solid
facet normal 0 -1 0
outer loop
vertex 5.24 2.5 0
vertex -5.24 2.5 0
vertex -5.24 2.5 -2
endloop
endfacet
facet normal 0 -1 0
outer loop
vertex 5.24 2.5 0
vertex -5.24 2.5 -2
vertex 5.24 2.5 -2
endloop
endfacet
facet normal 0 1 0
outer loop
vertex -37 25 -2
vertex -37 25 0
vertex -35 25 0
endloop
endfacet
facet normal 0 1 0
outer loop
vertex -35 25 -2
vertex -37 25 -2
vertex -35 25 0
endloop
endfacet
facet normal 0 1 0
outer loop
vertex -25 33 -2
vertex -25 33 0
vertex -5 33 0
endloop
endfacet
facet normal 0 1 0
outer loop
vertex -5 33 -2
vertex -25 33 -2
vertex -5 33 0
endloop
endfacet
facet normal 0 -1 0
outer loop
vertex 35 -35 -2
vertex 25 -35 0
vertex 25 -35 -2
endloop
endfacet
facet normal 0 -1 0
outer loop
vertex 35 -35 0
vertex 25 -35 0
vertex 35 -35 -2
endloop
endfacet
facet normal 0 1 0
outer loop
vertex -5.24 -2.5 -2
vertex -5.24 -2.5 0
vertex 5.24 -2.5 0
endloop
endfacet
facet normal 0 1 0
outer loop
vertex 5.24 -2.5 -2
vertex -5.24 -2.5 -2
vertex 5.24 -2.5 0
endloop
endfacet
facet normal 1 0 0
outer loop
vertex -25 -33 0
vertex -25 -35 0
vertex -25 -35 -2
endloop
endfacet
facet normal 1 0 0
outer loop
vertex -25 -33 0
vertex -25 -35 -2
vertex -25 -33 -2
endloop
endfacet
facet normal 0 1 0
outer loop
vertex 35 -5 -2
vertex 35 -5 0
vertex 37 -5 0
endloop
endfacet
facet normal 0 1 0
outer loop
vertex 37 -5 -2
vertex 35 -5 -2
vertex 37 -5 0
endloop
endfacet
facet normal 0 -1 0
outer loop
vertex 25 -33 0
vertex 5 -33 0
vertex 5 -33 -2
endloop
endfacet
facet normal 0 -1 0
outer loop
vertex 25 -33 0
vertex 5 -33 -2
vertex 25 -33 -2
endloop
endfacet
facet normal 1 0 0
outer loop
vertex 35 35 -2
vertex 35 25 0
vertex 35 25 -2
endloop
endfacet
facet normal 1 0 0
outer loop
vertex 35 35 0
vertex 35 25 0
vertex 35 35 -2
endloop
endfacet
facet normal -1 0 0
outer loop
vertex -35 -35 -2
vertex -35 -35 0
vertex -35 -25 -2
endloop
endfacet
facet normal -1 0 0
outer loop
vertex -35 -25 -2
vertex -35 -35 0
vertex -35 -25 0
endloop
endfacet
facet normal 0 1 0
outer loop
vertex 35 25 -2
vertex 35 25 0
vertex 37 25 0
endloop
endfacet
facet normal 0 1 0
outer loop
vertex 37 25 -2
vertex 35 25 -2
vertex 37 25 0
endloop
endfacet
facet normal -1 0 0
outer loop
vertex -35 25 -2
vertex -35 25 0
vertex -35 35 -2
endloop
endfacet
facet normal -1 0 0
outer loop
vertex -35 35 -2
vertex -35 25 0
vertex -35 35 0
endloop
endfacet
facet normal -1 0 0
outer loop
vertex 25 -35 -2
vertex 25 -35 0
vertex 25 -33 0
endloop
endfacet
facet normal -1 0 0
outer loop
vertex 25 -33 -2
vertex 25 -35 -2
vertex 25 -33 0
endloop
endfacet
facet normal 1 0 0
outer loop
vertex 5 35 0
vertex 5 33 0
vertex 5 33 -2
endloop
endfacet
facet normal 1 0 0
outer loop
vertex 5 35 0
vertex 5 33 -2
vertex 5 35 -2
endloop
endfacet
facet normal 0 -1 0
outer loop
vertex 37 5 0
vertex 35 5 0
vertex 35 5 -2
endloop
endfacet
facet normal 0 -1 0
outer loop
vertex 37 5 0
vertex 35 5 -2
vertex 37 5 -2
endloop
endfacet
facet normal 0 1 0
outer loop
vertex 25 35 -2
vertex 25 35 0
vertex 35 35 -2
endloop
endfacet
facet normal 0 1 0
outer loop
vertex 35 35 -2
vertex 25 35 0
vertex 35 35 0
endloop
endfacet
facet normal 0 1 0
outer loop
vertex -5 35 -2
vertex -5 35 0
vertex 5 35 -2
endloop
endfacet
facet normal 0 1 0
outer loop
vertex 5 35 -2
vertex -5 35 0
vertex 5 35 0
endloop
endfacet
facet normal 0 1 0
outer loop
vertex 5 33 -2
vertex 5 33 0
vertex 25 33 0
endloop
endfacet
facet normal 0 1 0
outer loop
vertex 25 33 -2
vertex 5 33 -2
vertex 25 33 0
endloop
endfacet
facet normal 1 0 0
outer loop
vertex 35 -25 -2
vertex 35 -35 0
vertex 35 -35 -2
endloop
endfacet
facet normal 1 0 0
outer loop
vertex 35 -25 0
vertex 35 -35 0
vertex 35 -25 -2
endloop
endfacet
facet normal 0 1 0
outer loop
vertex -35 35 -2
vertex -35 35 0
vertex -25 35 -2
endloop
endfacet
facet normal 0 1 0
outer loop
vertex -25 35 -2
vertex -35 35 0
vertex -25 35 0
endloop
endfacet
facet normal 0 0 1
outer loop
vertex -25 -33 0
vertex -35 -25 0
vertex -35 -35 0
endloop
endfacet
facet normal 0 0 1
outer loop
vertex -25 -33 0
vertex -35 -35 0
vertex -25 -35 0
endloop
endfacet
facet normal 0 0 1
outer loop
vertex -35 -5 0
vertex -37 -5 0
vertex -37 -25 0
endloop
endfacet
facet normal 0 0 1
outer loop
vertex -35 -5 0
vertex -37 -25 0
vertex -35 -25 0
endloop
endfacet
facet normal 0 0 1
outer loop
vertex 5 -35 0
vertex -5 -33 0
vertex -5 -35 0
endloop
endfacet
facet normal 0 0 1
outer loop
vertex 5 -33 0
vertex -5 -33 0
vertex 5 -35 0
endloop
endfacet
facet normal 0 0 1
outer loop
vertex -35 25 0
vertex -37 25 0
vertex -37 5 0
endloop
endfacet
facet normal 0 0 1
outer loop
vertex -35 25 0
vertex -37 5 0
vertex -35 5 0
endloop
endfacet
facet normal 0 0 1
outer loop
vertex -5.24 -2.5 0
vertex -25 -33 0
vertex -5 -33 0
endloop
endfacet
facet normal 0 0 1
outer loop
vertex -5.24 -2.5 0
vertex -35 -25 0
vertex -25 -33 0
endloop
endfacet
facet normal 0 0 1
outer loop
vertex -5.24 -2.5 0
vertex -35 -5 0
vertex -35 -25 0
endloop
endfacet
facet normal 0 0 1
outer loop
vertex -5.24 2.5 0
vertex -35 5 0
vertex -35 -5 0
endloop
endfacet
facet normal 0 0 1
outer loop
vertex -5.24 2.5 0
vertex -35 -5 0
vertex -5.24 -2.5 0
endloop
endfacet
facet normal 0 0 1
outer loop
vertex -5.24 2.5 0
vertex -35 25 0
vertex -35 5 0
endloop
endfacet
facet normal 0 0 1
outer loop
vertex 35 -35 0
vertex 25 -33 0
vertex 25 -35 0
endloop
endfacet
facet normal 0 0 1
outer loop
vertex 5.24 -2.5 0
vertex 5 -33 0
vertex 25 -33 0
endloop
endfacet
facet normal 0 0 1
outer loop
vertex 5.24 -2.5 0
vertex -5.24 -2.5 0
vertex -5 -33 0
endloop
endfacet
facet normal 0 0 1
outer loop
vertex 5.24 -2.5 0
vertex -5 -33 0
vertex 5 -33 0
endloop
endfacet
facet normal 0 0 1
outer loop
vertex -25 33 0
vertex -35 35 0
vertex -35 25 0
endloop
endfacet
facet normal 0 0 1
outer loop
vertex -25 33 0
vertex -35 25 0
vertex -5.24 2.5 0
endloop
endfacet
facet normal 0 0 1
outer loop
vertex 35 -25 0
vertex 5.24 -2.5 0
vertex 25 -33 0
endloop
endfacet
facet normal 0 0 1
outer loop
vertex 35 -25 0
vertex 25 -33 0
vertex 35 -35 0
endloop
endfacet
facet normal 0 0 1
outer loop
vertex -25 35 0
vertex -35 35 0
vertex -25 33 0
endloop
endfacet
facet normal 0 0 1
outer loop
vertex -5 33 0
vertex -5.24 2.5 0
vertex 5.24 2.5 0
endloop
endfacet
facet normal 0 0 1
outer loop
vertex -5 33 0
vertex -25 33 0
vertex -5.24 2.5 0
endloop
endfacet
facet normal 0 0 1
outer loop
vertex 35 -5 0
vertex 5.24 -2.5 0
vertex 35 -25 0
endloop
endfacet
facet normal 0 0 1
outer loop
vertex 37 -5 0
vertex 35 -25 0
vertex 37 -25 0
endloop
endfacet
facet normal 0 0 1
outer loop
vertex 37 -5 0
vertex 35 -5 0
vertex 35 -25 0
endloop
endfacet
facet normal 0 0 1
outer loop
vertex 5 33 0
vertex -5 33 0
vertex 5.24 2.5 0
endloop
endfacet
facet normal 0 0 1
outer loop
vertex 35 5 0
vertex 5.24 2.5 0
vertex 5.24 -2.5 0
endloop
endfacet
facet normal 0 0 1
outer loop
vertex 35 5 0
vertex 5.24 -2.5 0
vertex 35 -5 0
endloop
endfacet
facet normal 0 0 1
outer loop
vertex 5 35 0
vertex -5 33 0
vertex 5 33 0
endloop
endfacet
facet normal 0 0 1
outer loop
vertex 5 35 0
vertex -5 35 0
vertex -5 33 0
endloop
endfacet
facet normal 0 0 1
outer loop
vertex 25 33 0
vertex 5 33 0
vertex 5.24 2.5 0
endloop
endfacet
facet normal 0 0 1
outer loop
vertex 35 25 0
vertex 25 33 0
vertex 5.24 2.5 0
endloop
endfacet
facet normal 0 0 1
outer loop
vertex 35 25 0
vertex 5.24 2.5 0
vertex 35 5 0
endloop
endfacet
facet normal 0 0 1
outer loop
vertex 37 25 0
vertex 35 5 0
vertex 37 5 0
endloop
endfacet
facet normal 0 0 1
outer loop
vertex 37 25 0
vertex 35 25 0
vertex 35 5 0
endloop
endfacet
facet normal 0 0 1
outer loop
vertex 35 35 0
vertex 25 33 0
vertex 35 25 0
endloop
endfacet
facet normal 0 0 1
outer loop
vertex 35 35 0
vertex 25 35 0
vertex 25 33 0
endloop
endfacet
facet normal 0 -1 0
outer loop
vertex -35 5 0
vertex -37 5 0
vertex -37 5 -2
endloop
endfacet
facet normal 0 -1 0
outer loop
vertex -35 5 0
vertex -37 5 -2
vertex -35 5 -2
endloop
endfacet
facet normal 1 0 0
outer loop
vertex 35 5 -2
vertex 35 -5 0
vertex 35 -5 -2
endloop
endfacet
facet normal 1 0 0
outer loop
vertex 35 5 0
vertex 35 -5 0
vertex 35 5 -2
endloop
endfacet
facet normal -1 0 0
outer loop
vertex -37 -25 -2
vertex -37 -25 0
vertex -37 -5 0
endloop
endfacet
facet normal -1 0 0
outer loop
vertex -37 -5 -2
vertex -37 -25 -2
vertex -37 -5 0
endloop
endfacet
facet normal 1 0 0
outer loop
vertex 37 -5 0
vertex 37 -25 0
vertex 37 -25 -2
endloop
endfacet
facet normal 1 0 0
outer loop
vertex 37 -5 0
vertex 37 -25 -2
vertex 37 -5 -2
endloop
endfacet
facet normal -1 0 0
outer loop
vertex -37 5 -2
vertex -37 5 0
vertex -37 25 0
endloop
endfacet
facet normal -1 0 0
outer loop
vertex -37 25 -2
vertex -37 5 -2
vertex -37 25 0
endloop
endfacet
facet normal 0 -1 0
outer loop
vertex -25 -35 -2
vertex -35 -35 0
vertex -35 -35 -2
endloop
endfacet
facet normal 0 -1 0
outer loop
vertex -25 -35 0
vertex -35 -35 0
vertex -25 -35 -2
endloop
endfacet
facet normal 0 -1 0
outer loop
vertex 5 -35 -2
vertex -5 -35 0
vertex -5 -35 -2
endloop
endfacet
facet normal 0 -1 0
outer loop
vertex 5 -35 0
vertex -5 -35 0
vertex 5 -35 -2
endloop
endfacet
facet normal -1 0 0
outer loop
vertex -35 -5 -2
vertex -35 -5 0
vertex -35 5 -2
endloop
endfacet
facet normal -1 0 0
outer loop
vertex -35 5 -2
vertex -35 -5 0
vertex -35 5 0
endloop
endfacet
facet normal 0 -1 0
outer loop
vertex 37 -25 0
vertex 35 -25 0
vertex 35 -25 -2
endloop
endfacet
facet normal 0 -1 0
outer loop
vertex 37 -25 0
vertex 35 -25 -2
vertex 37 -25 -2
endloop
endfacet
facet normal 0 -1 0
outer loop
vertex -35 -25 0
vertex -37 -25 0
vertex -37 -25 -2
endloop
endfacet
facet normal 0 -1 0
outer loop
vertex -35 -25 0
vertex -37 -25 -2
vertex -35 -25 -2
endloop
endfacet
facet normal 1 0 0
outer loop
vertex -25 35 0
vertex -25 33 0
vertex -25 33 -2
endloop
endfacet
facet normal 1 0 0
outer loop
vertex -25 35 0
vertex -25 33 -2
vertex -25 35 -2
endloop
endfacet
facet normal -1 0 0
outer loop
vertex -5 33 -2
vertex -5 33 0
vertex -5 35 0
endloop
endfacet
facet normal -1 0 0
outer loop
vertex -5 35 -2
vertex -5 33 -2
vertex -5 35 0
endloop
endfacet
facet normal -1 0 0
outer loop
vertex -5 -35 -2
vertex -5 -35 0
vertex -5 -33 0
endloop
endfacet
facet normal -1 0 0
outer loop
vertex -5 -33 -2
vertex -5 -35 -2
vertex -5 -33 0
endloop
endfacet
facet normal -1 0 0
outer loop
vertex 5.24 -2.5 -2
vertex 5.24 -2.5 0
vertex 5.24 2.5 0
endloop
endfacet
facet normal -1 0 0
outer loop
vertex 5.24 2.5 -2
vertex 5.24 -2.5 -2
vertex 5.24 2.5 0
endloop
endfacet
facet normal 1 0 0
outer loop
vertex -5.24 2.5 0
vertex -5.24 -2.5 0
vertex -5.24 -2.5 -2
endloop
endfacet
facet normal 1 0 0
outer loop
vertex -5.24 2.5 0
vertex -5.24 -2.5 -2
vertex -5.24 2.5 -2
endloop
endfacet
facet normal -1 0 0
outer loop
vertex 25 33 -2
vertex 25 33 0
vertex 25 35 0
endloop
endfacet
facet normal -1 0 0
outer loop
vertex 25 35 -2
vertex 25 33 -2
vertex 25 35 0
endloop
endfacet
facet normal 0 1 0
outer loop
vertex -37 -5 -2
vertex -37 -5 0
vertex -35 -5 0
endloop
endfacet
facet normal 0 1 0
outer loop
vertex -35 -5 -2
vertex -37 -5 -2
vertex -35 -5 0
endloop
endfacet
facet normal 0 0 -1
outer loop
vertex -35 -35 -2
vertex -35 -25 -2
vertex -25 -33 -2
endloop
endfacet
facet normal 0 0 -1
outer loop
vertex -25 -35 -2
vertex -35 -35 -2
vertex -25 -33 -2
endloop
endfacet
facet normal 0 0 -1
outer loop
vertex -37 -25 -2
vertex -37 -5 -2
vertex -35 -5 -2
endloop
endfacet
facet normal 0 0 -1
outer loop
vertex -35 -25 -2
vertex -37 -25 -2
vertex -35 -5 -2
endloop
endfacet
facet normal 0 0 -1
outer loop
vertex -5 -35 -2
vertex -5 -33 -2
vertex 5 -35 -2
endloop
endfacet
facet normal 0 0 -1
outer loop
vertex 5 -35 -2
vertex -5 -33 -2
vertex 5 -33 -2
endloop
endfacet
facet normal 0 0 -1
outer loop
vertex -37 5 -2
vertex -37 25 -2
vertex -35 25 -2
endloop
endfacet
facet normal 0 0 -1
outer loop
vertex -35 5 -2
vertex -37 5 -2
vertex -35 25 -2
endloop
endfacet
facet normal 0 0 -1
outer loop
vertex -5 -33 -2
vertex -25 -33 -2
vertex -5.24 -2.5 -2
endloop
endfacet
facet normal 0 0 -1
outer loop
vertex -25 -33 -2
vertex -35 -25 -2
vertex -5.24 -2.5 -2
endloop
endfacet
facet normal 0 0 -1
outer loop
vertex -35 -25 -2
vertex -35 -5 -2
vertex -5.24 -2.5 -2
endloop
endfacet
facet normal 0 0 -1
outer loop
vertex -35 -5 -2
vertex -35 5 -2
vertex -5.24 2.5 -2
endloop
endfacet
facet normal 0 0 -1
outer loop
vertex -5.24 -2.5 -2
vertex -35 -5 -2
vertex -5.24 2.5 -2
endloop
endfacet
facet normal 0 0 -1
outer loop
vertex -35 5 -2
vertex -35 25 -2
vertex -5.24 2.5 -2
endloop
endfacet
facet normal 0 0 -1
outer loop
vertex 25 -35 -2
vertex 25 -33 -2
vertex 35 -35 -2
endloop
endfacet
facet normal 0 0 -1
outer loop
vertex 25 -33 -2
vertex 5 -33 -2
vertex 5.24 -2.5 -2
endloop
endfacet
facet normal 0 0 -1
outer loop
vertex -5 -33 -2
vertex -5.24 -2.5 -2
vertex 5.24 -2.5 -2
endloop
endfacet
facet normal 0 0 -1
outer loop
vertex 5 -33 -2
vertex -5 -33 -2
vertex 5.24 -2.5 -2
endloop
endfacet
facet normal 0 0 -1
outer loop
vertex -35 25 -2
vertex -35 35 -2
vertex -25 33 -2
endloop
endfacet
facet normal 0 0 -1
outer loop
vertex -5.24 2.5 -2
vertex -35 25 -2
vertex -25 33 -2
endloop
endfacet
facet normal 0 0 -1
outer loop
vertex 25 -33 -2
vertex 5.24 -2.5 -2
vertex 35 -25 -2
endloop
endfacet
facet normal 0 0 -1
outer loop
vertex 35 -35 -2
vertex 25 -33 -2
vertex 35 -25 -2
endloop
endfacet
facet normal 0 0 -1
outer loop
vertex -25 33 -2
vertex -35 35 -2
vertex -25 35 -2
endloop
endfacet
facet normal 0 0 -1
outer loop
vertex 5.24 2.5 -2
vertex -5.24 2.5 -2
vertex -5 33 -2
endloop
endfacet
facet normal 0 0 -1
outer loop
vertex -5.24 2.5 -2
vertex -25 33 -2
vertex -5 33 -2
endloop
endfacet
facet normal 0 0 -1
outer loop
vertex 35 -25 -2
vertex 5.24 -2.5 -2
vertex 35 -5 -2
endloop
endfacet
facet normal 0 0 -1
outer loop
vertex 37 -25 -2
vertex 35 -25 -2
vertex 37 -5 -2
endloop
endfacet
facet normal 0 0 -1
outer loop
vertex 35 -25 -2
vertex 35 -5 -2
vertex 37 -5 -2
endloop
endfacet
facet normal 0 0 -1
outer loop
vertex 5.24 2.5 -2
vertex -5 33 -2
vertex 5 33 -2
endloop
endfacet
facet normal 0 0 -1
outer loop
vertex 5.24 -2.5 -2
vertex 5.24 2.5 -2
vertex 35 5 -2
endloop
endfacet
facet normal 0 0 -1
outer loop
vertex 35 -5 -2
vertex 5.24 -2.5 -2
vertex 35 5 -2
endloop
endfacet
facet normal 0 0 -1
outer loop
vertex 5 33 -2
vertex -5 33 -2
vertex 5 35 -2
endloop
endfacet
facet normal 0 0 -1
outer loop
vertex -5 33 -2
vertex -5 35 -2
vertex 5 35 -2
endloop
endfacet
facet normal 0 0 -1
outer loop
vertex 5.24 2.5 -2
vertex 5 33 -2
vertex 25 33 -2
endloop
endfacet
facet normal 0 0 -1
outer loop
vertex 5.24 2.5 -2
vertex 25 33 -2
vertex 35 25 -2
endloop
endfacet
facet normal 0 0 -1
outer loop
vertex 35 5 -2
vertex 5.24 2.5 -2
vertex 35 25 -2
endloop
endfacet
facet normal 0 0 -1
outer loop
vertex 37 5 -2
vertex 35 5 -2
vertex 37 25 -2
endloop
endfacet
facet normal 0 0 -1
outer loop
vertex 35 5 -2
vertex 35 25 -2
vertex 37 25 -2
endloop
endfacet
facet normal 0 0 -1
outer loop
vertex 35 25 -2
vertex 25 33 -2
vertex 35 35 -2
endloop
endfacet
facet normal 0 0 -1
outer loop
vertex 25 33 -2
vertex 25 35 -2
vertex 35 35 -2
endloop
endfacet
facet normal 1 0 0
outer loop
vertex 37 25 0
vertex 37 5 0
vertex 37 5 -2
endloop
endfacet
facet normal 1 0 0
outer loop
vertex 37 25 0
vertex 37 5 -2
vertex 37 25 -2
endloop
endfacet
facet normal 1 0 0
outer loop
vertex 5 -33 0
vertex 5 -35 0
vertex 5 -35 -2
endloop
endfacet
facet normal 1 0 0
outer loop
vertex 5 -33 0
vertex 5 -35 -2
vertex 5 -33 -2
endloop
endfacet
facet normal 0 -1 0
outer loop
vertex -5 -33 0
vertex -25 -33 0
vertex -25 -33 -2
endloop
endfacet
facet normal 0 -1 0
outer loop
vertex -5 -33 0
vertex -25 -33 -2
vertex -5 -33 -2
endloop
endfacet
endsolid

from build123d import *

# Parameters (mm, degrees)
SKETCH1_W           = 70
SKETCH1_H           = 70
BOSS_EXTRUDE1_DEPTH = 2
SKETCH2_W           = 2
SKETCH2_H           = 20
BOSS_EXTRUDE2_DEPTH = 2
SKETCH3_W           = 20
SKETCH3_H           = 2
CUT_EXTRUDE1_DEPTH  = 2
SKETCH4_W           = 10.48
SKETCH4_H           = 5
CUT_EXTRUDE2_DEPTH  = 10


with BuildPart() as part:
    # Sketch1 → Boss-Extrude1 (new body)
    with BuildSketch(Plane.XY):
        Rectangle(SKETCH1_W, SKETCH1_H)
    extrude(amount=-BOSS_EXTRUDE1_DEPTH)

    # Sketch2 → Boss-Extrude2 (add)
    with BuildSketch(Plane.XY):
        with Locations((-36, 15)):
            Rectangle(SKETCH2_W, SKETCH2_H)
        with Locations((-36, -15)):
            Rectangle(SKETCH2_W, SKETCH2_H)
        with Locations((36, -15)):
            Rectangle(SKETCH2_W, SKETCH2_H)
        with Locations((36, 15)):
            Rectangle(SKETCH2_W, SKETCH2_H)
    extrude(amount=-BOSS_EXTRUDE2_DEPTH)

    # Sketch3 → Cut-Extrude1 (cut)
    with BuildSketch(Plane.XY):
        with Locations((-15, 34)):
            Rectangle(SKETCH3_W, SKETCH3_H)
        with Locations((15, 34)):
            Rectangle(SKETCH3_W, SKETCH3_H)
        with Locations((-15, -34)):
            Rectangle(SKETCH3_W, SKETCH3_H)
        with Locations((15, -34)):
            Rectangle(SKETCH3_W, SKETCH3_H)
    extrude(amount=-CUT_EXTRUDE1_DEPTH, mode=Mode.SUBTRACT)

    # Sketch4 → Cut-Extrude2 (cut)
    with BuildSketch(Plane.XY):
        Rectangle(SKETCH4_W, SKETCH4_H)
    extrude(amount=-CUT_EXTRUDE2_DEPTH, mode=Mode.SUBTRACT)


solid = part.part
